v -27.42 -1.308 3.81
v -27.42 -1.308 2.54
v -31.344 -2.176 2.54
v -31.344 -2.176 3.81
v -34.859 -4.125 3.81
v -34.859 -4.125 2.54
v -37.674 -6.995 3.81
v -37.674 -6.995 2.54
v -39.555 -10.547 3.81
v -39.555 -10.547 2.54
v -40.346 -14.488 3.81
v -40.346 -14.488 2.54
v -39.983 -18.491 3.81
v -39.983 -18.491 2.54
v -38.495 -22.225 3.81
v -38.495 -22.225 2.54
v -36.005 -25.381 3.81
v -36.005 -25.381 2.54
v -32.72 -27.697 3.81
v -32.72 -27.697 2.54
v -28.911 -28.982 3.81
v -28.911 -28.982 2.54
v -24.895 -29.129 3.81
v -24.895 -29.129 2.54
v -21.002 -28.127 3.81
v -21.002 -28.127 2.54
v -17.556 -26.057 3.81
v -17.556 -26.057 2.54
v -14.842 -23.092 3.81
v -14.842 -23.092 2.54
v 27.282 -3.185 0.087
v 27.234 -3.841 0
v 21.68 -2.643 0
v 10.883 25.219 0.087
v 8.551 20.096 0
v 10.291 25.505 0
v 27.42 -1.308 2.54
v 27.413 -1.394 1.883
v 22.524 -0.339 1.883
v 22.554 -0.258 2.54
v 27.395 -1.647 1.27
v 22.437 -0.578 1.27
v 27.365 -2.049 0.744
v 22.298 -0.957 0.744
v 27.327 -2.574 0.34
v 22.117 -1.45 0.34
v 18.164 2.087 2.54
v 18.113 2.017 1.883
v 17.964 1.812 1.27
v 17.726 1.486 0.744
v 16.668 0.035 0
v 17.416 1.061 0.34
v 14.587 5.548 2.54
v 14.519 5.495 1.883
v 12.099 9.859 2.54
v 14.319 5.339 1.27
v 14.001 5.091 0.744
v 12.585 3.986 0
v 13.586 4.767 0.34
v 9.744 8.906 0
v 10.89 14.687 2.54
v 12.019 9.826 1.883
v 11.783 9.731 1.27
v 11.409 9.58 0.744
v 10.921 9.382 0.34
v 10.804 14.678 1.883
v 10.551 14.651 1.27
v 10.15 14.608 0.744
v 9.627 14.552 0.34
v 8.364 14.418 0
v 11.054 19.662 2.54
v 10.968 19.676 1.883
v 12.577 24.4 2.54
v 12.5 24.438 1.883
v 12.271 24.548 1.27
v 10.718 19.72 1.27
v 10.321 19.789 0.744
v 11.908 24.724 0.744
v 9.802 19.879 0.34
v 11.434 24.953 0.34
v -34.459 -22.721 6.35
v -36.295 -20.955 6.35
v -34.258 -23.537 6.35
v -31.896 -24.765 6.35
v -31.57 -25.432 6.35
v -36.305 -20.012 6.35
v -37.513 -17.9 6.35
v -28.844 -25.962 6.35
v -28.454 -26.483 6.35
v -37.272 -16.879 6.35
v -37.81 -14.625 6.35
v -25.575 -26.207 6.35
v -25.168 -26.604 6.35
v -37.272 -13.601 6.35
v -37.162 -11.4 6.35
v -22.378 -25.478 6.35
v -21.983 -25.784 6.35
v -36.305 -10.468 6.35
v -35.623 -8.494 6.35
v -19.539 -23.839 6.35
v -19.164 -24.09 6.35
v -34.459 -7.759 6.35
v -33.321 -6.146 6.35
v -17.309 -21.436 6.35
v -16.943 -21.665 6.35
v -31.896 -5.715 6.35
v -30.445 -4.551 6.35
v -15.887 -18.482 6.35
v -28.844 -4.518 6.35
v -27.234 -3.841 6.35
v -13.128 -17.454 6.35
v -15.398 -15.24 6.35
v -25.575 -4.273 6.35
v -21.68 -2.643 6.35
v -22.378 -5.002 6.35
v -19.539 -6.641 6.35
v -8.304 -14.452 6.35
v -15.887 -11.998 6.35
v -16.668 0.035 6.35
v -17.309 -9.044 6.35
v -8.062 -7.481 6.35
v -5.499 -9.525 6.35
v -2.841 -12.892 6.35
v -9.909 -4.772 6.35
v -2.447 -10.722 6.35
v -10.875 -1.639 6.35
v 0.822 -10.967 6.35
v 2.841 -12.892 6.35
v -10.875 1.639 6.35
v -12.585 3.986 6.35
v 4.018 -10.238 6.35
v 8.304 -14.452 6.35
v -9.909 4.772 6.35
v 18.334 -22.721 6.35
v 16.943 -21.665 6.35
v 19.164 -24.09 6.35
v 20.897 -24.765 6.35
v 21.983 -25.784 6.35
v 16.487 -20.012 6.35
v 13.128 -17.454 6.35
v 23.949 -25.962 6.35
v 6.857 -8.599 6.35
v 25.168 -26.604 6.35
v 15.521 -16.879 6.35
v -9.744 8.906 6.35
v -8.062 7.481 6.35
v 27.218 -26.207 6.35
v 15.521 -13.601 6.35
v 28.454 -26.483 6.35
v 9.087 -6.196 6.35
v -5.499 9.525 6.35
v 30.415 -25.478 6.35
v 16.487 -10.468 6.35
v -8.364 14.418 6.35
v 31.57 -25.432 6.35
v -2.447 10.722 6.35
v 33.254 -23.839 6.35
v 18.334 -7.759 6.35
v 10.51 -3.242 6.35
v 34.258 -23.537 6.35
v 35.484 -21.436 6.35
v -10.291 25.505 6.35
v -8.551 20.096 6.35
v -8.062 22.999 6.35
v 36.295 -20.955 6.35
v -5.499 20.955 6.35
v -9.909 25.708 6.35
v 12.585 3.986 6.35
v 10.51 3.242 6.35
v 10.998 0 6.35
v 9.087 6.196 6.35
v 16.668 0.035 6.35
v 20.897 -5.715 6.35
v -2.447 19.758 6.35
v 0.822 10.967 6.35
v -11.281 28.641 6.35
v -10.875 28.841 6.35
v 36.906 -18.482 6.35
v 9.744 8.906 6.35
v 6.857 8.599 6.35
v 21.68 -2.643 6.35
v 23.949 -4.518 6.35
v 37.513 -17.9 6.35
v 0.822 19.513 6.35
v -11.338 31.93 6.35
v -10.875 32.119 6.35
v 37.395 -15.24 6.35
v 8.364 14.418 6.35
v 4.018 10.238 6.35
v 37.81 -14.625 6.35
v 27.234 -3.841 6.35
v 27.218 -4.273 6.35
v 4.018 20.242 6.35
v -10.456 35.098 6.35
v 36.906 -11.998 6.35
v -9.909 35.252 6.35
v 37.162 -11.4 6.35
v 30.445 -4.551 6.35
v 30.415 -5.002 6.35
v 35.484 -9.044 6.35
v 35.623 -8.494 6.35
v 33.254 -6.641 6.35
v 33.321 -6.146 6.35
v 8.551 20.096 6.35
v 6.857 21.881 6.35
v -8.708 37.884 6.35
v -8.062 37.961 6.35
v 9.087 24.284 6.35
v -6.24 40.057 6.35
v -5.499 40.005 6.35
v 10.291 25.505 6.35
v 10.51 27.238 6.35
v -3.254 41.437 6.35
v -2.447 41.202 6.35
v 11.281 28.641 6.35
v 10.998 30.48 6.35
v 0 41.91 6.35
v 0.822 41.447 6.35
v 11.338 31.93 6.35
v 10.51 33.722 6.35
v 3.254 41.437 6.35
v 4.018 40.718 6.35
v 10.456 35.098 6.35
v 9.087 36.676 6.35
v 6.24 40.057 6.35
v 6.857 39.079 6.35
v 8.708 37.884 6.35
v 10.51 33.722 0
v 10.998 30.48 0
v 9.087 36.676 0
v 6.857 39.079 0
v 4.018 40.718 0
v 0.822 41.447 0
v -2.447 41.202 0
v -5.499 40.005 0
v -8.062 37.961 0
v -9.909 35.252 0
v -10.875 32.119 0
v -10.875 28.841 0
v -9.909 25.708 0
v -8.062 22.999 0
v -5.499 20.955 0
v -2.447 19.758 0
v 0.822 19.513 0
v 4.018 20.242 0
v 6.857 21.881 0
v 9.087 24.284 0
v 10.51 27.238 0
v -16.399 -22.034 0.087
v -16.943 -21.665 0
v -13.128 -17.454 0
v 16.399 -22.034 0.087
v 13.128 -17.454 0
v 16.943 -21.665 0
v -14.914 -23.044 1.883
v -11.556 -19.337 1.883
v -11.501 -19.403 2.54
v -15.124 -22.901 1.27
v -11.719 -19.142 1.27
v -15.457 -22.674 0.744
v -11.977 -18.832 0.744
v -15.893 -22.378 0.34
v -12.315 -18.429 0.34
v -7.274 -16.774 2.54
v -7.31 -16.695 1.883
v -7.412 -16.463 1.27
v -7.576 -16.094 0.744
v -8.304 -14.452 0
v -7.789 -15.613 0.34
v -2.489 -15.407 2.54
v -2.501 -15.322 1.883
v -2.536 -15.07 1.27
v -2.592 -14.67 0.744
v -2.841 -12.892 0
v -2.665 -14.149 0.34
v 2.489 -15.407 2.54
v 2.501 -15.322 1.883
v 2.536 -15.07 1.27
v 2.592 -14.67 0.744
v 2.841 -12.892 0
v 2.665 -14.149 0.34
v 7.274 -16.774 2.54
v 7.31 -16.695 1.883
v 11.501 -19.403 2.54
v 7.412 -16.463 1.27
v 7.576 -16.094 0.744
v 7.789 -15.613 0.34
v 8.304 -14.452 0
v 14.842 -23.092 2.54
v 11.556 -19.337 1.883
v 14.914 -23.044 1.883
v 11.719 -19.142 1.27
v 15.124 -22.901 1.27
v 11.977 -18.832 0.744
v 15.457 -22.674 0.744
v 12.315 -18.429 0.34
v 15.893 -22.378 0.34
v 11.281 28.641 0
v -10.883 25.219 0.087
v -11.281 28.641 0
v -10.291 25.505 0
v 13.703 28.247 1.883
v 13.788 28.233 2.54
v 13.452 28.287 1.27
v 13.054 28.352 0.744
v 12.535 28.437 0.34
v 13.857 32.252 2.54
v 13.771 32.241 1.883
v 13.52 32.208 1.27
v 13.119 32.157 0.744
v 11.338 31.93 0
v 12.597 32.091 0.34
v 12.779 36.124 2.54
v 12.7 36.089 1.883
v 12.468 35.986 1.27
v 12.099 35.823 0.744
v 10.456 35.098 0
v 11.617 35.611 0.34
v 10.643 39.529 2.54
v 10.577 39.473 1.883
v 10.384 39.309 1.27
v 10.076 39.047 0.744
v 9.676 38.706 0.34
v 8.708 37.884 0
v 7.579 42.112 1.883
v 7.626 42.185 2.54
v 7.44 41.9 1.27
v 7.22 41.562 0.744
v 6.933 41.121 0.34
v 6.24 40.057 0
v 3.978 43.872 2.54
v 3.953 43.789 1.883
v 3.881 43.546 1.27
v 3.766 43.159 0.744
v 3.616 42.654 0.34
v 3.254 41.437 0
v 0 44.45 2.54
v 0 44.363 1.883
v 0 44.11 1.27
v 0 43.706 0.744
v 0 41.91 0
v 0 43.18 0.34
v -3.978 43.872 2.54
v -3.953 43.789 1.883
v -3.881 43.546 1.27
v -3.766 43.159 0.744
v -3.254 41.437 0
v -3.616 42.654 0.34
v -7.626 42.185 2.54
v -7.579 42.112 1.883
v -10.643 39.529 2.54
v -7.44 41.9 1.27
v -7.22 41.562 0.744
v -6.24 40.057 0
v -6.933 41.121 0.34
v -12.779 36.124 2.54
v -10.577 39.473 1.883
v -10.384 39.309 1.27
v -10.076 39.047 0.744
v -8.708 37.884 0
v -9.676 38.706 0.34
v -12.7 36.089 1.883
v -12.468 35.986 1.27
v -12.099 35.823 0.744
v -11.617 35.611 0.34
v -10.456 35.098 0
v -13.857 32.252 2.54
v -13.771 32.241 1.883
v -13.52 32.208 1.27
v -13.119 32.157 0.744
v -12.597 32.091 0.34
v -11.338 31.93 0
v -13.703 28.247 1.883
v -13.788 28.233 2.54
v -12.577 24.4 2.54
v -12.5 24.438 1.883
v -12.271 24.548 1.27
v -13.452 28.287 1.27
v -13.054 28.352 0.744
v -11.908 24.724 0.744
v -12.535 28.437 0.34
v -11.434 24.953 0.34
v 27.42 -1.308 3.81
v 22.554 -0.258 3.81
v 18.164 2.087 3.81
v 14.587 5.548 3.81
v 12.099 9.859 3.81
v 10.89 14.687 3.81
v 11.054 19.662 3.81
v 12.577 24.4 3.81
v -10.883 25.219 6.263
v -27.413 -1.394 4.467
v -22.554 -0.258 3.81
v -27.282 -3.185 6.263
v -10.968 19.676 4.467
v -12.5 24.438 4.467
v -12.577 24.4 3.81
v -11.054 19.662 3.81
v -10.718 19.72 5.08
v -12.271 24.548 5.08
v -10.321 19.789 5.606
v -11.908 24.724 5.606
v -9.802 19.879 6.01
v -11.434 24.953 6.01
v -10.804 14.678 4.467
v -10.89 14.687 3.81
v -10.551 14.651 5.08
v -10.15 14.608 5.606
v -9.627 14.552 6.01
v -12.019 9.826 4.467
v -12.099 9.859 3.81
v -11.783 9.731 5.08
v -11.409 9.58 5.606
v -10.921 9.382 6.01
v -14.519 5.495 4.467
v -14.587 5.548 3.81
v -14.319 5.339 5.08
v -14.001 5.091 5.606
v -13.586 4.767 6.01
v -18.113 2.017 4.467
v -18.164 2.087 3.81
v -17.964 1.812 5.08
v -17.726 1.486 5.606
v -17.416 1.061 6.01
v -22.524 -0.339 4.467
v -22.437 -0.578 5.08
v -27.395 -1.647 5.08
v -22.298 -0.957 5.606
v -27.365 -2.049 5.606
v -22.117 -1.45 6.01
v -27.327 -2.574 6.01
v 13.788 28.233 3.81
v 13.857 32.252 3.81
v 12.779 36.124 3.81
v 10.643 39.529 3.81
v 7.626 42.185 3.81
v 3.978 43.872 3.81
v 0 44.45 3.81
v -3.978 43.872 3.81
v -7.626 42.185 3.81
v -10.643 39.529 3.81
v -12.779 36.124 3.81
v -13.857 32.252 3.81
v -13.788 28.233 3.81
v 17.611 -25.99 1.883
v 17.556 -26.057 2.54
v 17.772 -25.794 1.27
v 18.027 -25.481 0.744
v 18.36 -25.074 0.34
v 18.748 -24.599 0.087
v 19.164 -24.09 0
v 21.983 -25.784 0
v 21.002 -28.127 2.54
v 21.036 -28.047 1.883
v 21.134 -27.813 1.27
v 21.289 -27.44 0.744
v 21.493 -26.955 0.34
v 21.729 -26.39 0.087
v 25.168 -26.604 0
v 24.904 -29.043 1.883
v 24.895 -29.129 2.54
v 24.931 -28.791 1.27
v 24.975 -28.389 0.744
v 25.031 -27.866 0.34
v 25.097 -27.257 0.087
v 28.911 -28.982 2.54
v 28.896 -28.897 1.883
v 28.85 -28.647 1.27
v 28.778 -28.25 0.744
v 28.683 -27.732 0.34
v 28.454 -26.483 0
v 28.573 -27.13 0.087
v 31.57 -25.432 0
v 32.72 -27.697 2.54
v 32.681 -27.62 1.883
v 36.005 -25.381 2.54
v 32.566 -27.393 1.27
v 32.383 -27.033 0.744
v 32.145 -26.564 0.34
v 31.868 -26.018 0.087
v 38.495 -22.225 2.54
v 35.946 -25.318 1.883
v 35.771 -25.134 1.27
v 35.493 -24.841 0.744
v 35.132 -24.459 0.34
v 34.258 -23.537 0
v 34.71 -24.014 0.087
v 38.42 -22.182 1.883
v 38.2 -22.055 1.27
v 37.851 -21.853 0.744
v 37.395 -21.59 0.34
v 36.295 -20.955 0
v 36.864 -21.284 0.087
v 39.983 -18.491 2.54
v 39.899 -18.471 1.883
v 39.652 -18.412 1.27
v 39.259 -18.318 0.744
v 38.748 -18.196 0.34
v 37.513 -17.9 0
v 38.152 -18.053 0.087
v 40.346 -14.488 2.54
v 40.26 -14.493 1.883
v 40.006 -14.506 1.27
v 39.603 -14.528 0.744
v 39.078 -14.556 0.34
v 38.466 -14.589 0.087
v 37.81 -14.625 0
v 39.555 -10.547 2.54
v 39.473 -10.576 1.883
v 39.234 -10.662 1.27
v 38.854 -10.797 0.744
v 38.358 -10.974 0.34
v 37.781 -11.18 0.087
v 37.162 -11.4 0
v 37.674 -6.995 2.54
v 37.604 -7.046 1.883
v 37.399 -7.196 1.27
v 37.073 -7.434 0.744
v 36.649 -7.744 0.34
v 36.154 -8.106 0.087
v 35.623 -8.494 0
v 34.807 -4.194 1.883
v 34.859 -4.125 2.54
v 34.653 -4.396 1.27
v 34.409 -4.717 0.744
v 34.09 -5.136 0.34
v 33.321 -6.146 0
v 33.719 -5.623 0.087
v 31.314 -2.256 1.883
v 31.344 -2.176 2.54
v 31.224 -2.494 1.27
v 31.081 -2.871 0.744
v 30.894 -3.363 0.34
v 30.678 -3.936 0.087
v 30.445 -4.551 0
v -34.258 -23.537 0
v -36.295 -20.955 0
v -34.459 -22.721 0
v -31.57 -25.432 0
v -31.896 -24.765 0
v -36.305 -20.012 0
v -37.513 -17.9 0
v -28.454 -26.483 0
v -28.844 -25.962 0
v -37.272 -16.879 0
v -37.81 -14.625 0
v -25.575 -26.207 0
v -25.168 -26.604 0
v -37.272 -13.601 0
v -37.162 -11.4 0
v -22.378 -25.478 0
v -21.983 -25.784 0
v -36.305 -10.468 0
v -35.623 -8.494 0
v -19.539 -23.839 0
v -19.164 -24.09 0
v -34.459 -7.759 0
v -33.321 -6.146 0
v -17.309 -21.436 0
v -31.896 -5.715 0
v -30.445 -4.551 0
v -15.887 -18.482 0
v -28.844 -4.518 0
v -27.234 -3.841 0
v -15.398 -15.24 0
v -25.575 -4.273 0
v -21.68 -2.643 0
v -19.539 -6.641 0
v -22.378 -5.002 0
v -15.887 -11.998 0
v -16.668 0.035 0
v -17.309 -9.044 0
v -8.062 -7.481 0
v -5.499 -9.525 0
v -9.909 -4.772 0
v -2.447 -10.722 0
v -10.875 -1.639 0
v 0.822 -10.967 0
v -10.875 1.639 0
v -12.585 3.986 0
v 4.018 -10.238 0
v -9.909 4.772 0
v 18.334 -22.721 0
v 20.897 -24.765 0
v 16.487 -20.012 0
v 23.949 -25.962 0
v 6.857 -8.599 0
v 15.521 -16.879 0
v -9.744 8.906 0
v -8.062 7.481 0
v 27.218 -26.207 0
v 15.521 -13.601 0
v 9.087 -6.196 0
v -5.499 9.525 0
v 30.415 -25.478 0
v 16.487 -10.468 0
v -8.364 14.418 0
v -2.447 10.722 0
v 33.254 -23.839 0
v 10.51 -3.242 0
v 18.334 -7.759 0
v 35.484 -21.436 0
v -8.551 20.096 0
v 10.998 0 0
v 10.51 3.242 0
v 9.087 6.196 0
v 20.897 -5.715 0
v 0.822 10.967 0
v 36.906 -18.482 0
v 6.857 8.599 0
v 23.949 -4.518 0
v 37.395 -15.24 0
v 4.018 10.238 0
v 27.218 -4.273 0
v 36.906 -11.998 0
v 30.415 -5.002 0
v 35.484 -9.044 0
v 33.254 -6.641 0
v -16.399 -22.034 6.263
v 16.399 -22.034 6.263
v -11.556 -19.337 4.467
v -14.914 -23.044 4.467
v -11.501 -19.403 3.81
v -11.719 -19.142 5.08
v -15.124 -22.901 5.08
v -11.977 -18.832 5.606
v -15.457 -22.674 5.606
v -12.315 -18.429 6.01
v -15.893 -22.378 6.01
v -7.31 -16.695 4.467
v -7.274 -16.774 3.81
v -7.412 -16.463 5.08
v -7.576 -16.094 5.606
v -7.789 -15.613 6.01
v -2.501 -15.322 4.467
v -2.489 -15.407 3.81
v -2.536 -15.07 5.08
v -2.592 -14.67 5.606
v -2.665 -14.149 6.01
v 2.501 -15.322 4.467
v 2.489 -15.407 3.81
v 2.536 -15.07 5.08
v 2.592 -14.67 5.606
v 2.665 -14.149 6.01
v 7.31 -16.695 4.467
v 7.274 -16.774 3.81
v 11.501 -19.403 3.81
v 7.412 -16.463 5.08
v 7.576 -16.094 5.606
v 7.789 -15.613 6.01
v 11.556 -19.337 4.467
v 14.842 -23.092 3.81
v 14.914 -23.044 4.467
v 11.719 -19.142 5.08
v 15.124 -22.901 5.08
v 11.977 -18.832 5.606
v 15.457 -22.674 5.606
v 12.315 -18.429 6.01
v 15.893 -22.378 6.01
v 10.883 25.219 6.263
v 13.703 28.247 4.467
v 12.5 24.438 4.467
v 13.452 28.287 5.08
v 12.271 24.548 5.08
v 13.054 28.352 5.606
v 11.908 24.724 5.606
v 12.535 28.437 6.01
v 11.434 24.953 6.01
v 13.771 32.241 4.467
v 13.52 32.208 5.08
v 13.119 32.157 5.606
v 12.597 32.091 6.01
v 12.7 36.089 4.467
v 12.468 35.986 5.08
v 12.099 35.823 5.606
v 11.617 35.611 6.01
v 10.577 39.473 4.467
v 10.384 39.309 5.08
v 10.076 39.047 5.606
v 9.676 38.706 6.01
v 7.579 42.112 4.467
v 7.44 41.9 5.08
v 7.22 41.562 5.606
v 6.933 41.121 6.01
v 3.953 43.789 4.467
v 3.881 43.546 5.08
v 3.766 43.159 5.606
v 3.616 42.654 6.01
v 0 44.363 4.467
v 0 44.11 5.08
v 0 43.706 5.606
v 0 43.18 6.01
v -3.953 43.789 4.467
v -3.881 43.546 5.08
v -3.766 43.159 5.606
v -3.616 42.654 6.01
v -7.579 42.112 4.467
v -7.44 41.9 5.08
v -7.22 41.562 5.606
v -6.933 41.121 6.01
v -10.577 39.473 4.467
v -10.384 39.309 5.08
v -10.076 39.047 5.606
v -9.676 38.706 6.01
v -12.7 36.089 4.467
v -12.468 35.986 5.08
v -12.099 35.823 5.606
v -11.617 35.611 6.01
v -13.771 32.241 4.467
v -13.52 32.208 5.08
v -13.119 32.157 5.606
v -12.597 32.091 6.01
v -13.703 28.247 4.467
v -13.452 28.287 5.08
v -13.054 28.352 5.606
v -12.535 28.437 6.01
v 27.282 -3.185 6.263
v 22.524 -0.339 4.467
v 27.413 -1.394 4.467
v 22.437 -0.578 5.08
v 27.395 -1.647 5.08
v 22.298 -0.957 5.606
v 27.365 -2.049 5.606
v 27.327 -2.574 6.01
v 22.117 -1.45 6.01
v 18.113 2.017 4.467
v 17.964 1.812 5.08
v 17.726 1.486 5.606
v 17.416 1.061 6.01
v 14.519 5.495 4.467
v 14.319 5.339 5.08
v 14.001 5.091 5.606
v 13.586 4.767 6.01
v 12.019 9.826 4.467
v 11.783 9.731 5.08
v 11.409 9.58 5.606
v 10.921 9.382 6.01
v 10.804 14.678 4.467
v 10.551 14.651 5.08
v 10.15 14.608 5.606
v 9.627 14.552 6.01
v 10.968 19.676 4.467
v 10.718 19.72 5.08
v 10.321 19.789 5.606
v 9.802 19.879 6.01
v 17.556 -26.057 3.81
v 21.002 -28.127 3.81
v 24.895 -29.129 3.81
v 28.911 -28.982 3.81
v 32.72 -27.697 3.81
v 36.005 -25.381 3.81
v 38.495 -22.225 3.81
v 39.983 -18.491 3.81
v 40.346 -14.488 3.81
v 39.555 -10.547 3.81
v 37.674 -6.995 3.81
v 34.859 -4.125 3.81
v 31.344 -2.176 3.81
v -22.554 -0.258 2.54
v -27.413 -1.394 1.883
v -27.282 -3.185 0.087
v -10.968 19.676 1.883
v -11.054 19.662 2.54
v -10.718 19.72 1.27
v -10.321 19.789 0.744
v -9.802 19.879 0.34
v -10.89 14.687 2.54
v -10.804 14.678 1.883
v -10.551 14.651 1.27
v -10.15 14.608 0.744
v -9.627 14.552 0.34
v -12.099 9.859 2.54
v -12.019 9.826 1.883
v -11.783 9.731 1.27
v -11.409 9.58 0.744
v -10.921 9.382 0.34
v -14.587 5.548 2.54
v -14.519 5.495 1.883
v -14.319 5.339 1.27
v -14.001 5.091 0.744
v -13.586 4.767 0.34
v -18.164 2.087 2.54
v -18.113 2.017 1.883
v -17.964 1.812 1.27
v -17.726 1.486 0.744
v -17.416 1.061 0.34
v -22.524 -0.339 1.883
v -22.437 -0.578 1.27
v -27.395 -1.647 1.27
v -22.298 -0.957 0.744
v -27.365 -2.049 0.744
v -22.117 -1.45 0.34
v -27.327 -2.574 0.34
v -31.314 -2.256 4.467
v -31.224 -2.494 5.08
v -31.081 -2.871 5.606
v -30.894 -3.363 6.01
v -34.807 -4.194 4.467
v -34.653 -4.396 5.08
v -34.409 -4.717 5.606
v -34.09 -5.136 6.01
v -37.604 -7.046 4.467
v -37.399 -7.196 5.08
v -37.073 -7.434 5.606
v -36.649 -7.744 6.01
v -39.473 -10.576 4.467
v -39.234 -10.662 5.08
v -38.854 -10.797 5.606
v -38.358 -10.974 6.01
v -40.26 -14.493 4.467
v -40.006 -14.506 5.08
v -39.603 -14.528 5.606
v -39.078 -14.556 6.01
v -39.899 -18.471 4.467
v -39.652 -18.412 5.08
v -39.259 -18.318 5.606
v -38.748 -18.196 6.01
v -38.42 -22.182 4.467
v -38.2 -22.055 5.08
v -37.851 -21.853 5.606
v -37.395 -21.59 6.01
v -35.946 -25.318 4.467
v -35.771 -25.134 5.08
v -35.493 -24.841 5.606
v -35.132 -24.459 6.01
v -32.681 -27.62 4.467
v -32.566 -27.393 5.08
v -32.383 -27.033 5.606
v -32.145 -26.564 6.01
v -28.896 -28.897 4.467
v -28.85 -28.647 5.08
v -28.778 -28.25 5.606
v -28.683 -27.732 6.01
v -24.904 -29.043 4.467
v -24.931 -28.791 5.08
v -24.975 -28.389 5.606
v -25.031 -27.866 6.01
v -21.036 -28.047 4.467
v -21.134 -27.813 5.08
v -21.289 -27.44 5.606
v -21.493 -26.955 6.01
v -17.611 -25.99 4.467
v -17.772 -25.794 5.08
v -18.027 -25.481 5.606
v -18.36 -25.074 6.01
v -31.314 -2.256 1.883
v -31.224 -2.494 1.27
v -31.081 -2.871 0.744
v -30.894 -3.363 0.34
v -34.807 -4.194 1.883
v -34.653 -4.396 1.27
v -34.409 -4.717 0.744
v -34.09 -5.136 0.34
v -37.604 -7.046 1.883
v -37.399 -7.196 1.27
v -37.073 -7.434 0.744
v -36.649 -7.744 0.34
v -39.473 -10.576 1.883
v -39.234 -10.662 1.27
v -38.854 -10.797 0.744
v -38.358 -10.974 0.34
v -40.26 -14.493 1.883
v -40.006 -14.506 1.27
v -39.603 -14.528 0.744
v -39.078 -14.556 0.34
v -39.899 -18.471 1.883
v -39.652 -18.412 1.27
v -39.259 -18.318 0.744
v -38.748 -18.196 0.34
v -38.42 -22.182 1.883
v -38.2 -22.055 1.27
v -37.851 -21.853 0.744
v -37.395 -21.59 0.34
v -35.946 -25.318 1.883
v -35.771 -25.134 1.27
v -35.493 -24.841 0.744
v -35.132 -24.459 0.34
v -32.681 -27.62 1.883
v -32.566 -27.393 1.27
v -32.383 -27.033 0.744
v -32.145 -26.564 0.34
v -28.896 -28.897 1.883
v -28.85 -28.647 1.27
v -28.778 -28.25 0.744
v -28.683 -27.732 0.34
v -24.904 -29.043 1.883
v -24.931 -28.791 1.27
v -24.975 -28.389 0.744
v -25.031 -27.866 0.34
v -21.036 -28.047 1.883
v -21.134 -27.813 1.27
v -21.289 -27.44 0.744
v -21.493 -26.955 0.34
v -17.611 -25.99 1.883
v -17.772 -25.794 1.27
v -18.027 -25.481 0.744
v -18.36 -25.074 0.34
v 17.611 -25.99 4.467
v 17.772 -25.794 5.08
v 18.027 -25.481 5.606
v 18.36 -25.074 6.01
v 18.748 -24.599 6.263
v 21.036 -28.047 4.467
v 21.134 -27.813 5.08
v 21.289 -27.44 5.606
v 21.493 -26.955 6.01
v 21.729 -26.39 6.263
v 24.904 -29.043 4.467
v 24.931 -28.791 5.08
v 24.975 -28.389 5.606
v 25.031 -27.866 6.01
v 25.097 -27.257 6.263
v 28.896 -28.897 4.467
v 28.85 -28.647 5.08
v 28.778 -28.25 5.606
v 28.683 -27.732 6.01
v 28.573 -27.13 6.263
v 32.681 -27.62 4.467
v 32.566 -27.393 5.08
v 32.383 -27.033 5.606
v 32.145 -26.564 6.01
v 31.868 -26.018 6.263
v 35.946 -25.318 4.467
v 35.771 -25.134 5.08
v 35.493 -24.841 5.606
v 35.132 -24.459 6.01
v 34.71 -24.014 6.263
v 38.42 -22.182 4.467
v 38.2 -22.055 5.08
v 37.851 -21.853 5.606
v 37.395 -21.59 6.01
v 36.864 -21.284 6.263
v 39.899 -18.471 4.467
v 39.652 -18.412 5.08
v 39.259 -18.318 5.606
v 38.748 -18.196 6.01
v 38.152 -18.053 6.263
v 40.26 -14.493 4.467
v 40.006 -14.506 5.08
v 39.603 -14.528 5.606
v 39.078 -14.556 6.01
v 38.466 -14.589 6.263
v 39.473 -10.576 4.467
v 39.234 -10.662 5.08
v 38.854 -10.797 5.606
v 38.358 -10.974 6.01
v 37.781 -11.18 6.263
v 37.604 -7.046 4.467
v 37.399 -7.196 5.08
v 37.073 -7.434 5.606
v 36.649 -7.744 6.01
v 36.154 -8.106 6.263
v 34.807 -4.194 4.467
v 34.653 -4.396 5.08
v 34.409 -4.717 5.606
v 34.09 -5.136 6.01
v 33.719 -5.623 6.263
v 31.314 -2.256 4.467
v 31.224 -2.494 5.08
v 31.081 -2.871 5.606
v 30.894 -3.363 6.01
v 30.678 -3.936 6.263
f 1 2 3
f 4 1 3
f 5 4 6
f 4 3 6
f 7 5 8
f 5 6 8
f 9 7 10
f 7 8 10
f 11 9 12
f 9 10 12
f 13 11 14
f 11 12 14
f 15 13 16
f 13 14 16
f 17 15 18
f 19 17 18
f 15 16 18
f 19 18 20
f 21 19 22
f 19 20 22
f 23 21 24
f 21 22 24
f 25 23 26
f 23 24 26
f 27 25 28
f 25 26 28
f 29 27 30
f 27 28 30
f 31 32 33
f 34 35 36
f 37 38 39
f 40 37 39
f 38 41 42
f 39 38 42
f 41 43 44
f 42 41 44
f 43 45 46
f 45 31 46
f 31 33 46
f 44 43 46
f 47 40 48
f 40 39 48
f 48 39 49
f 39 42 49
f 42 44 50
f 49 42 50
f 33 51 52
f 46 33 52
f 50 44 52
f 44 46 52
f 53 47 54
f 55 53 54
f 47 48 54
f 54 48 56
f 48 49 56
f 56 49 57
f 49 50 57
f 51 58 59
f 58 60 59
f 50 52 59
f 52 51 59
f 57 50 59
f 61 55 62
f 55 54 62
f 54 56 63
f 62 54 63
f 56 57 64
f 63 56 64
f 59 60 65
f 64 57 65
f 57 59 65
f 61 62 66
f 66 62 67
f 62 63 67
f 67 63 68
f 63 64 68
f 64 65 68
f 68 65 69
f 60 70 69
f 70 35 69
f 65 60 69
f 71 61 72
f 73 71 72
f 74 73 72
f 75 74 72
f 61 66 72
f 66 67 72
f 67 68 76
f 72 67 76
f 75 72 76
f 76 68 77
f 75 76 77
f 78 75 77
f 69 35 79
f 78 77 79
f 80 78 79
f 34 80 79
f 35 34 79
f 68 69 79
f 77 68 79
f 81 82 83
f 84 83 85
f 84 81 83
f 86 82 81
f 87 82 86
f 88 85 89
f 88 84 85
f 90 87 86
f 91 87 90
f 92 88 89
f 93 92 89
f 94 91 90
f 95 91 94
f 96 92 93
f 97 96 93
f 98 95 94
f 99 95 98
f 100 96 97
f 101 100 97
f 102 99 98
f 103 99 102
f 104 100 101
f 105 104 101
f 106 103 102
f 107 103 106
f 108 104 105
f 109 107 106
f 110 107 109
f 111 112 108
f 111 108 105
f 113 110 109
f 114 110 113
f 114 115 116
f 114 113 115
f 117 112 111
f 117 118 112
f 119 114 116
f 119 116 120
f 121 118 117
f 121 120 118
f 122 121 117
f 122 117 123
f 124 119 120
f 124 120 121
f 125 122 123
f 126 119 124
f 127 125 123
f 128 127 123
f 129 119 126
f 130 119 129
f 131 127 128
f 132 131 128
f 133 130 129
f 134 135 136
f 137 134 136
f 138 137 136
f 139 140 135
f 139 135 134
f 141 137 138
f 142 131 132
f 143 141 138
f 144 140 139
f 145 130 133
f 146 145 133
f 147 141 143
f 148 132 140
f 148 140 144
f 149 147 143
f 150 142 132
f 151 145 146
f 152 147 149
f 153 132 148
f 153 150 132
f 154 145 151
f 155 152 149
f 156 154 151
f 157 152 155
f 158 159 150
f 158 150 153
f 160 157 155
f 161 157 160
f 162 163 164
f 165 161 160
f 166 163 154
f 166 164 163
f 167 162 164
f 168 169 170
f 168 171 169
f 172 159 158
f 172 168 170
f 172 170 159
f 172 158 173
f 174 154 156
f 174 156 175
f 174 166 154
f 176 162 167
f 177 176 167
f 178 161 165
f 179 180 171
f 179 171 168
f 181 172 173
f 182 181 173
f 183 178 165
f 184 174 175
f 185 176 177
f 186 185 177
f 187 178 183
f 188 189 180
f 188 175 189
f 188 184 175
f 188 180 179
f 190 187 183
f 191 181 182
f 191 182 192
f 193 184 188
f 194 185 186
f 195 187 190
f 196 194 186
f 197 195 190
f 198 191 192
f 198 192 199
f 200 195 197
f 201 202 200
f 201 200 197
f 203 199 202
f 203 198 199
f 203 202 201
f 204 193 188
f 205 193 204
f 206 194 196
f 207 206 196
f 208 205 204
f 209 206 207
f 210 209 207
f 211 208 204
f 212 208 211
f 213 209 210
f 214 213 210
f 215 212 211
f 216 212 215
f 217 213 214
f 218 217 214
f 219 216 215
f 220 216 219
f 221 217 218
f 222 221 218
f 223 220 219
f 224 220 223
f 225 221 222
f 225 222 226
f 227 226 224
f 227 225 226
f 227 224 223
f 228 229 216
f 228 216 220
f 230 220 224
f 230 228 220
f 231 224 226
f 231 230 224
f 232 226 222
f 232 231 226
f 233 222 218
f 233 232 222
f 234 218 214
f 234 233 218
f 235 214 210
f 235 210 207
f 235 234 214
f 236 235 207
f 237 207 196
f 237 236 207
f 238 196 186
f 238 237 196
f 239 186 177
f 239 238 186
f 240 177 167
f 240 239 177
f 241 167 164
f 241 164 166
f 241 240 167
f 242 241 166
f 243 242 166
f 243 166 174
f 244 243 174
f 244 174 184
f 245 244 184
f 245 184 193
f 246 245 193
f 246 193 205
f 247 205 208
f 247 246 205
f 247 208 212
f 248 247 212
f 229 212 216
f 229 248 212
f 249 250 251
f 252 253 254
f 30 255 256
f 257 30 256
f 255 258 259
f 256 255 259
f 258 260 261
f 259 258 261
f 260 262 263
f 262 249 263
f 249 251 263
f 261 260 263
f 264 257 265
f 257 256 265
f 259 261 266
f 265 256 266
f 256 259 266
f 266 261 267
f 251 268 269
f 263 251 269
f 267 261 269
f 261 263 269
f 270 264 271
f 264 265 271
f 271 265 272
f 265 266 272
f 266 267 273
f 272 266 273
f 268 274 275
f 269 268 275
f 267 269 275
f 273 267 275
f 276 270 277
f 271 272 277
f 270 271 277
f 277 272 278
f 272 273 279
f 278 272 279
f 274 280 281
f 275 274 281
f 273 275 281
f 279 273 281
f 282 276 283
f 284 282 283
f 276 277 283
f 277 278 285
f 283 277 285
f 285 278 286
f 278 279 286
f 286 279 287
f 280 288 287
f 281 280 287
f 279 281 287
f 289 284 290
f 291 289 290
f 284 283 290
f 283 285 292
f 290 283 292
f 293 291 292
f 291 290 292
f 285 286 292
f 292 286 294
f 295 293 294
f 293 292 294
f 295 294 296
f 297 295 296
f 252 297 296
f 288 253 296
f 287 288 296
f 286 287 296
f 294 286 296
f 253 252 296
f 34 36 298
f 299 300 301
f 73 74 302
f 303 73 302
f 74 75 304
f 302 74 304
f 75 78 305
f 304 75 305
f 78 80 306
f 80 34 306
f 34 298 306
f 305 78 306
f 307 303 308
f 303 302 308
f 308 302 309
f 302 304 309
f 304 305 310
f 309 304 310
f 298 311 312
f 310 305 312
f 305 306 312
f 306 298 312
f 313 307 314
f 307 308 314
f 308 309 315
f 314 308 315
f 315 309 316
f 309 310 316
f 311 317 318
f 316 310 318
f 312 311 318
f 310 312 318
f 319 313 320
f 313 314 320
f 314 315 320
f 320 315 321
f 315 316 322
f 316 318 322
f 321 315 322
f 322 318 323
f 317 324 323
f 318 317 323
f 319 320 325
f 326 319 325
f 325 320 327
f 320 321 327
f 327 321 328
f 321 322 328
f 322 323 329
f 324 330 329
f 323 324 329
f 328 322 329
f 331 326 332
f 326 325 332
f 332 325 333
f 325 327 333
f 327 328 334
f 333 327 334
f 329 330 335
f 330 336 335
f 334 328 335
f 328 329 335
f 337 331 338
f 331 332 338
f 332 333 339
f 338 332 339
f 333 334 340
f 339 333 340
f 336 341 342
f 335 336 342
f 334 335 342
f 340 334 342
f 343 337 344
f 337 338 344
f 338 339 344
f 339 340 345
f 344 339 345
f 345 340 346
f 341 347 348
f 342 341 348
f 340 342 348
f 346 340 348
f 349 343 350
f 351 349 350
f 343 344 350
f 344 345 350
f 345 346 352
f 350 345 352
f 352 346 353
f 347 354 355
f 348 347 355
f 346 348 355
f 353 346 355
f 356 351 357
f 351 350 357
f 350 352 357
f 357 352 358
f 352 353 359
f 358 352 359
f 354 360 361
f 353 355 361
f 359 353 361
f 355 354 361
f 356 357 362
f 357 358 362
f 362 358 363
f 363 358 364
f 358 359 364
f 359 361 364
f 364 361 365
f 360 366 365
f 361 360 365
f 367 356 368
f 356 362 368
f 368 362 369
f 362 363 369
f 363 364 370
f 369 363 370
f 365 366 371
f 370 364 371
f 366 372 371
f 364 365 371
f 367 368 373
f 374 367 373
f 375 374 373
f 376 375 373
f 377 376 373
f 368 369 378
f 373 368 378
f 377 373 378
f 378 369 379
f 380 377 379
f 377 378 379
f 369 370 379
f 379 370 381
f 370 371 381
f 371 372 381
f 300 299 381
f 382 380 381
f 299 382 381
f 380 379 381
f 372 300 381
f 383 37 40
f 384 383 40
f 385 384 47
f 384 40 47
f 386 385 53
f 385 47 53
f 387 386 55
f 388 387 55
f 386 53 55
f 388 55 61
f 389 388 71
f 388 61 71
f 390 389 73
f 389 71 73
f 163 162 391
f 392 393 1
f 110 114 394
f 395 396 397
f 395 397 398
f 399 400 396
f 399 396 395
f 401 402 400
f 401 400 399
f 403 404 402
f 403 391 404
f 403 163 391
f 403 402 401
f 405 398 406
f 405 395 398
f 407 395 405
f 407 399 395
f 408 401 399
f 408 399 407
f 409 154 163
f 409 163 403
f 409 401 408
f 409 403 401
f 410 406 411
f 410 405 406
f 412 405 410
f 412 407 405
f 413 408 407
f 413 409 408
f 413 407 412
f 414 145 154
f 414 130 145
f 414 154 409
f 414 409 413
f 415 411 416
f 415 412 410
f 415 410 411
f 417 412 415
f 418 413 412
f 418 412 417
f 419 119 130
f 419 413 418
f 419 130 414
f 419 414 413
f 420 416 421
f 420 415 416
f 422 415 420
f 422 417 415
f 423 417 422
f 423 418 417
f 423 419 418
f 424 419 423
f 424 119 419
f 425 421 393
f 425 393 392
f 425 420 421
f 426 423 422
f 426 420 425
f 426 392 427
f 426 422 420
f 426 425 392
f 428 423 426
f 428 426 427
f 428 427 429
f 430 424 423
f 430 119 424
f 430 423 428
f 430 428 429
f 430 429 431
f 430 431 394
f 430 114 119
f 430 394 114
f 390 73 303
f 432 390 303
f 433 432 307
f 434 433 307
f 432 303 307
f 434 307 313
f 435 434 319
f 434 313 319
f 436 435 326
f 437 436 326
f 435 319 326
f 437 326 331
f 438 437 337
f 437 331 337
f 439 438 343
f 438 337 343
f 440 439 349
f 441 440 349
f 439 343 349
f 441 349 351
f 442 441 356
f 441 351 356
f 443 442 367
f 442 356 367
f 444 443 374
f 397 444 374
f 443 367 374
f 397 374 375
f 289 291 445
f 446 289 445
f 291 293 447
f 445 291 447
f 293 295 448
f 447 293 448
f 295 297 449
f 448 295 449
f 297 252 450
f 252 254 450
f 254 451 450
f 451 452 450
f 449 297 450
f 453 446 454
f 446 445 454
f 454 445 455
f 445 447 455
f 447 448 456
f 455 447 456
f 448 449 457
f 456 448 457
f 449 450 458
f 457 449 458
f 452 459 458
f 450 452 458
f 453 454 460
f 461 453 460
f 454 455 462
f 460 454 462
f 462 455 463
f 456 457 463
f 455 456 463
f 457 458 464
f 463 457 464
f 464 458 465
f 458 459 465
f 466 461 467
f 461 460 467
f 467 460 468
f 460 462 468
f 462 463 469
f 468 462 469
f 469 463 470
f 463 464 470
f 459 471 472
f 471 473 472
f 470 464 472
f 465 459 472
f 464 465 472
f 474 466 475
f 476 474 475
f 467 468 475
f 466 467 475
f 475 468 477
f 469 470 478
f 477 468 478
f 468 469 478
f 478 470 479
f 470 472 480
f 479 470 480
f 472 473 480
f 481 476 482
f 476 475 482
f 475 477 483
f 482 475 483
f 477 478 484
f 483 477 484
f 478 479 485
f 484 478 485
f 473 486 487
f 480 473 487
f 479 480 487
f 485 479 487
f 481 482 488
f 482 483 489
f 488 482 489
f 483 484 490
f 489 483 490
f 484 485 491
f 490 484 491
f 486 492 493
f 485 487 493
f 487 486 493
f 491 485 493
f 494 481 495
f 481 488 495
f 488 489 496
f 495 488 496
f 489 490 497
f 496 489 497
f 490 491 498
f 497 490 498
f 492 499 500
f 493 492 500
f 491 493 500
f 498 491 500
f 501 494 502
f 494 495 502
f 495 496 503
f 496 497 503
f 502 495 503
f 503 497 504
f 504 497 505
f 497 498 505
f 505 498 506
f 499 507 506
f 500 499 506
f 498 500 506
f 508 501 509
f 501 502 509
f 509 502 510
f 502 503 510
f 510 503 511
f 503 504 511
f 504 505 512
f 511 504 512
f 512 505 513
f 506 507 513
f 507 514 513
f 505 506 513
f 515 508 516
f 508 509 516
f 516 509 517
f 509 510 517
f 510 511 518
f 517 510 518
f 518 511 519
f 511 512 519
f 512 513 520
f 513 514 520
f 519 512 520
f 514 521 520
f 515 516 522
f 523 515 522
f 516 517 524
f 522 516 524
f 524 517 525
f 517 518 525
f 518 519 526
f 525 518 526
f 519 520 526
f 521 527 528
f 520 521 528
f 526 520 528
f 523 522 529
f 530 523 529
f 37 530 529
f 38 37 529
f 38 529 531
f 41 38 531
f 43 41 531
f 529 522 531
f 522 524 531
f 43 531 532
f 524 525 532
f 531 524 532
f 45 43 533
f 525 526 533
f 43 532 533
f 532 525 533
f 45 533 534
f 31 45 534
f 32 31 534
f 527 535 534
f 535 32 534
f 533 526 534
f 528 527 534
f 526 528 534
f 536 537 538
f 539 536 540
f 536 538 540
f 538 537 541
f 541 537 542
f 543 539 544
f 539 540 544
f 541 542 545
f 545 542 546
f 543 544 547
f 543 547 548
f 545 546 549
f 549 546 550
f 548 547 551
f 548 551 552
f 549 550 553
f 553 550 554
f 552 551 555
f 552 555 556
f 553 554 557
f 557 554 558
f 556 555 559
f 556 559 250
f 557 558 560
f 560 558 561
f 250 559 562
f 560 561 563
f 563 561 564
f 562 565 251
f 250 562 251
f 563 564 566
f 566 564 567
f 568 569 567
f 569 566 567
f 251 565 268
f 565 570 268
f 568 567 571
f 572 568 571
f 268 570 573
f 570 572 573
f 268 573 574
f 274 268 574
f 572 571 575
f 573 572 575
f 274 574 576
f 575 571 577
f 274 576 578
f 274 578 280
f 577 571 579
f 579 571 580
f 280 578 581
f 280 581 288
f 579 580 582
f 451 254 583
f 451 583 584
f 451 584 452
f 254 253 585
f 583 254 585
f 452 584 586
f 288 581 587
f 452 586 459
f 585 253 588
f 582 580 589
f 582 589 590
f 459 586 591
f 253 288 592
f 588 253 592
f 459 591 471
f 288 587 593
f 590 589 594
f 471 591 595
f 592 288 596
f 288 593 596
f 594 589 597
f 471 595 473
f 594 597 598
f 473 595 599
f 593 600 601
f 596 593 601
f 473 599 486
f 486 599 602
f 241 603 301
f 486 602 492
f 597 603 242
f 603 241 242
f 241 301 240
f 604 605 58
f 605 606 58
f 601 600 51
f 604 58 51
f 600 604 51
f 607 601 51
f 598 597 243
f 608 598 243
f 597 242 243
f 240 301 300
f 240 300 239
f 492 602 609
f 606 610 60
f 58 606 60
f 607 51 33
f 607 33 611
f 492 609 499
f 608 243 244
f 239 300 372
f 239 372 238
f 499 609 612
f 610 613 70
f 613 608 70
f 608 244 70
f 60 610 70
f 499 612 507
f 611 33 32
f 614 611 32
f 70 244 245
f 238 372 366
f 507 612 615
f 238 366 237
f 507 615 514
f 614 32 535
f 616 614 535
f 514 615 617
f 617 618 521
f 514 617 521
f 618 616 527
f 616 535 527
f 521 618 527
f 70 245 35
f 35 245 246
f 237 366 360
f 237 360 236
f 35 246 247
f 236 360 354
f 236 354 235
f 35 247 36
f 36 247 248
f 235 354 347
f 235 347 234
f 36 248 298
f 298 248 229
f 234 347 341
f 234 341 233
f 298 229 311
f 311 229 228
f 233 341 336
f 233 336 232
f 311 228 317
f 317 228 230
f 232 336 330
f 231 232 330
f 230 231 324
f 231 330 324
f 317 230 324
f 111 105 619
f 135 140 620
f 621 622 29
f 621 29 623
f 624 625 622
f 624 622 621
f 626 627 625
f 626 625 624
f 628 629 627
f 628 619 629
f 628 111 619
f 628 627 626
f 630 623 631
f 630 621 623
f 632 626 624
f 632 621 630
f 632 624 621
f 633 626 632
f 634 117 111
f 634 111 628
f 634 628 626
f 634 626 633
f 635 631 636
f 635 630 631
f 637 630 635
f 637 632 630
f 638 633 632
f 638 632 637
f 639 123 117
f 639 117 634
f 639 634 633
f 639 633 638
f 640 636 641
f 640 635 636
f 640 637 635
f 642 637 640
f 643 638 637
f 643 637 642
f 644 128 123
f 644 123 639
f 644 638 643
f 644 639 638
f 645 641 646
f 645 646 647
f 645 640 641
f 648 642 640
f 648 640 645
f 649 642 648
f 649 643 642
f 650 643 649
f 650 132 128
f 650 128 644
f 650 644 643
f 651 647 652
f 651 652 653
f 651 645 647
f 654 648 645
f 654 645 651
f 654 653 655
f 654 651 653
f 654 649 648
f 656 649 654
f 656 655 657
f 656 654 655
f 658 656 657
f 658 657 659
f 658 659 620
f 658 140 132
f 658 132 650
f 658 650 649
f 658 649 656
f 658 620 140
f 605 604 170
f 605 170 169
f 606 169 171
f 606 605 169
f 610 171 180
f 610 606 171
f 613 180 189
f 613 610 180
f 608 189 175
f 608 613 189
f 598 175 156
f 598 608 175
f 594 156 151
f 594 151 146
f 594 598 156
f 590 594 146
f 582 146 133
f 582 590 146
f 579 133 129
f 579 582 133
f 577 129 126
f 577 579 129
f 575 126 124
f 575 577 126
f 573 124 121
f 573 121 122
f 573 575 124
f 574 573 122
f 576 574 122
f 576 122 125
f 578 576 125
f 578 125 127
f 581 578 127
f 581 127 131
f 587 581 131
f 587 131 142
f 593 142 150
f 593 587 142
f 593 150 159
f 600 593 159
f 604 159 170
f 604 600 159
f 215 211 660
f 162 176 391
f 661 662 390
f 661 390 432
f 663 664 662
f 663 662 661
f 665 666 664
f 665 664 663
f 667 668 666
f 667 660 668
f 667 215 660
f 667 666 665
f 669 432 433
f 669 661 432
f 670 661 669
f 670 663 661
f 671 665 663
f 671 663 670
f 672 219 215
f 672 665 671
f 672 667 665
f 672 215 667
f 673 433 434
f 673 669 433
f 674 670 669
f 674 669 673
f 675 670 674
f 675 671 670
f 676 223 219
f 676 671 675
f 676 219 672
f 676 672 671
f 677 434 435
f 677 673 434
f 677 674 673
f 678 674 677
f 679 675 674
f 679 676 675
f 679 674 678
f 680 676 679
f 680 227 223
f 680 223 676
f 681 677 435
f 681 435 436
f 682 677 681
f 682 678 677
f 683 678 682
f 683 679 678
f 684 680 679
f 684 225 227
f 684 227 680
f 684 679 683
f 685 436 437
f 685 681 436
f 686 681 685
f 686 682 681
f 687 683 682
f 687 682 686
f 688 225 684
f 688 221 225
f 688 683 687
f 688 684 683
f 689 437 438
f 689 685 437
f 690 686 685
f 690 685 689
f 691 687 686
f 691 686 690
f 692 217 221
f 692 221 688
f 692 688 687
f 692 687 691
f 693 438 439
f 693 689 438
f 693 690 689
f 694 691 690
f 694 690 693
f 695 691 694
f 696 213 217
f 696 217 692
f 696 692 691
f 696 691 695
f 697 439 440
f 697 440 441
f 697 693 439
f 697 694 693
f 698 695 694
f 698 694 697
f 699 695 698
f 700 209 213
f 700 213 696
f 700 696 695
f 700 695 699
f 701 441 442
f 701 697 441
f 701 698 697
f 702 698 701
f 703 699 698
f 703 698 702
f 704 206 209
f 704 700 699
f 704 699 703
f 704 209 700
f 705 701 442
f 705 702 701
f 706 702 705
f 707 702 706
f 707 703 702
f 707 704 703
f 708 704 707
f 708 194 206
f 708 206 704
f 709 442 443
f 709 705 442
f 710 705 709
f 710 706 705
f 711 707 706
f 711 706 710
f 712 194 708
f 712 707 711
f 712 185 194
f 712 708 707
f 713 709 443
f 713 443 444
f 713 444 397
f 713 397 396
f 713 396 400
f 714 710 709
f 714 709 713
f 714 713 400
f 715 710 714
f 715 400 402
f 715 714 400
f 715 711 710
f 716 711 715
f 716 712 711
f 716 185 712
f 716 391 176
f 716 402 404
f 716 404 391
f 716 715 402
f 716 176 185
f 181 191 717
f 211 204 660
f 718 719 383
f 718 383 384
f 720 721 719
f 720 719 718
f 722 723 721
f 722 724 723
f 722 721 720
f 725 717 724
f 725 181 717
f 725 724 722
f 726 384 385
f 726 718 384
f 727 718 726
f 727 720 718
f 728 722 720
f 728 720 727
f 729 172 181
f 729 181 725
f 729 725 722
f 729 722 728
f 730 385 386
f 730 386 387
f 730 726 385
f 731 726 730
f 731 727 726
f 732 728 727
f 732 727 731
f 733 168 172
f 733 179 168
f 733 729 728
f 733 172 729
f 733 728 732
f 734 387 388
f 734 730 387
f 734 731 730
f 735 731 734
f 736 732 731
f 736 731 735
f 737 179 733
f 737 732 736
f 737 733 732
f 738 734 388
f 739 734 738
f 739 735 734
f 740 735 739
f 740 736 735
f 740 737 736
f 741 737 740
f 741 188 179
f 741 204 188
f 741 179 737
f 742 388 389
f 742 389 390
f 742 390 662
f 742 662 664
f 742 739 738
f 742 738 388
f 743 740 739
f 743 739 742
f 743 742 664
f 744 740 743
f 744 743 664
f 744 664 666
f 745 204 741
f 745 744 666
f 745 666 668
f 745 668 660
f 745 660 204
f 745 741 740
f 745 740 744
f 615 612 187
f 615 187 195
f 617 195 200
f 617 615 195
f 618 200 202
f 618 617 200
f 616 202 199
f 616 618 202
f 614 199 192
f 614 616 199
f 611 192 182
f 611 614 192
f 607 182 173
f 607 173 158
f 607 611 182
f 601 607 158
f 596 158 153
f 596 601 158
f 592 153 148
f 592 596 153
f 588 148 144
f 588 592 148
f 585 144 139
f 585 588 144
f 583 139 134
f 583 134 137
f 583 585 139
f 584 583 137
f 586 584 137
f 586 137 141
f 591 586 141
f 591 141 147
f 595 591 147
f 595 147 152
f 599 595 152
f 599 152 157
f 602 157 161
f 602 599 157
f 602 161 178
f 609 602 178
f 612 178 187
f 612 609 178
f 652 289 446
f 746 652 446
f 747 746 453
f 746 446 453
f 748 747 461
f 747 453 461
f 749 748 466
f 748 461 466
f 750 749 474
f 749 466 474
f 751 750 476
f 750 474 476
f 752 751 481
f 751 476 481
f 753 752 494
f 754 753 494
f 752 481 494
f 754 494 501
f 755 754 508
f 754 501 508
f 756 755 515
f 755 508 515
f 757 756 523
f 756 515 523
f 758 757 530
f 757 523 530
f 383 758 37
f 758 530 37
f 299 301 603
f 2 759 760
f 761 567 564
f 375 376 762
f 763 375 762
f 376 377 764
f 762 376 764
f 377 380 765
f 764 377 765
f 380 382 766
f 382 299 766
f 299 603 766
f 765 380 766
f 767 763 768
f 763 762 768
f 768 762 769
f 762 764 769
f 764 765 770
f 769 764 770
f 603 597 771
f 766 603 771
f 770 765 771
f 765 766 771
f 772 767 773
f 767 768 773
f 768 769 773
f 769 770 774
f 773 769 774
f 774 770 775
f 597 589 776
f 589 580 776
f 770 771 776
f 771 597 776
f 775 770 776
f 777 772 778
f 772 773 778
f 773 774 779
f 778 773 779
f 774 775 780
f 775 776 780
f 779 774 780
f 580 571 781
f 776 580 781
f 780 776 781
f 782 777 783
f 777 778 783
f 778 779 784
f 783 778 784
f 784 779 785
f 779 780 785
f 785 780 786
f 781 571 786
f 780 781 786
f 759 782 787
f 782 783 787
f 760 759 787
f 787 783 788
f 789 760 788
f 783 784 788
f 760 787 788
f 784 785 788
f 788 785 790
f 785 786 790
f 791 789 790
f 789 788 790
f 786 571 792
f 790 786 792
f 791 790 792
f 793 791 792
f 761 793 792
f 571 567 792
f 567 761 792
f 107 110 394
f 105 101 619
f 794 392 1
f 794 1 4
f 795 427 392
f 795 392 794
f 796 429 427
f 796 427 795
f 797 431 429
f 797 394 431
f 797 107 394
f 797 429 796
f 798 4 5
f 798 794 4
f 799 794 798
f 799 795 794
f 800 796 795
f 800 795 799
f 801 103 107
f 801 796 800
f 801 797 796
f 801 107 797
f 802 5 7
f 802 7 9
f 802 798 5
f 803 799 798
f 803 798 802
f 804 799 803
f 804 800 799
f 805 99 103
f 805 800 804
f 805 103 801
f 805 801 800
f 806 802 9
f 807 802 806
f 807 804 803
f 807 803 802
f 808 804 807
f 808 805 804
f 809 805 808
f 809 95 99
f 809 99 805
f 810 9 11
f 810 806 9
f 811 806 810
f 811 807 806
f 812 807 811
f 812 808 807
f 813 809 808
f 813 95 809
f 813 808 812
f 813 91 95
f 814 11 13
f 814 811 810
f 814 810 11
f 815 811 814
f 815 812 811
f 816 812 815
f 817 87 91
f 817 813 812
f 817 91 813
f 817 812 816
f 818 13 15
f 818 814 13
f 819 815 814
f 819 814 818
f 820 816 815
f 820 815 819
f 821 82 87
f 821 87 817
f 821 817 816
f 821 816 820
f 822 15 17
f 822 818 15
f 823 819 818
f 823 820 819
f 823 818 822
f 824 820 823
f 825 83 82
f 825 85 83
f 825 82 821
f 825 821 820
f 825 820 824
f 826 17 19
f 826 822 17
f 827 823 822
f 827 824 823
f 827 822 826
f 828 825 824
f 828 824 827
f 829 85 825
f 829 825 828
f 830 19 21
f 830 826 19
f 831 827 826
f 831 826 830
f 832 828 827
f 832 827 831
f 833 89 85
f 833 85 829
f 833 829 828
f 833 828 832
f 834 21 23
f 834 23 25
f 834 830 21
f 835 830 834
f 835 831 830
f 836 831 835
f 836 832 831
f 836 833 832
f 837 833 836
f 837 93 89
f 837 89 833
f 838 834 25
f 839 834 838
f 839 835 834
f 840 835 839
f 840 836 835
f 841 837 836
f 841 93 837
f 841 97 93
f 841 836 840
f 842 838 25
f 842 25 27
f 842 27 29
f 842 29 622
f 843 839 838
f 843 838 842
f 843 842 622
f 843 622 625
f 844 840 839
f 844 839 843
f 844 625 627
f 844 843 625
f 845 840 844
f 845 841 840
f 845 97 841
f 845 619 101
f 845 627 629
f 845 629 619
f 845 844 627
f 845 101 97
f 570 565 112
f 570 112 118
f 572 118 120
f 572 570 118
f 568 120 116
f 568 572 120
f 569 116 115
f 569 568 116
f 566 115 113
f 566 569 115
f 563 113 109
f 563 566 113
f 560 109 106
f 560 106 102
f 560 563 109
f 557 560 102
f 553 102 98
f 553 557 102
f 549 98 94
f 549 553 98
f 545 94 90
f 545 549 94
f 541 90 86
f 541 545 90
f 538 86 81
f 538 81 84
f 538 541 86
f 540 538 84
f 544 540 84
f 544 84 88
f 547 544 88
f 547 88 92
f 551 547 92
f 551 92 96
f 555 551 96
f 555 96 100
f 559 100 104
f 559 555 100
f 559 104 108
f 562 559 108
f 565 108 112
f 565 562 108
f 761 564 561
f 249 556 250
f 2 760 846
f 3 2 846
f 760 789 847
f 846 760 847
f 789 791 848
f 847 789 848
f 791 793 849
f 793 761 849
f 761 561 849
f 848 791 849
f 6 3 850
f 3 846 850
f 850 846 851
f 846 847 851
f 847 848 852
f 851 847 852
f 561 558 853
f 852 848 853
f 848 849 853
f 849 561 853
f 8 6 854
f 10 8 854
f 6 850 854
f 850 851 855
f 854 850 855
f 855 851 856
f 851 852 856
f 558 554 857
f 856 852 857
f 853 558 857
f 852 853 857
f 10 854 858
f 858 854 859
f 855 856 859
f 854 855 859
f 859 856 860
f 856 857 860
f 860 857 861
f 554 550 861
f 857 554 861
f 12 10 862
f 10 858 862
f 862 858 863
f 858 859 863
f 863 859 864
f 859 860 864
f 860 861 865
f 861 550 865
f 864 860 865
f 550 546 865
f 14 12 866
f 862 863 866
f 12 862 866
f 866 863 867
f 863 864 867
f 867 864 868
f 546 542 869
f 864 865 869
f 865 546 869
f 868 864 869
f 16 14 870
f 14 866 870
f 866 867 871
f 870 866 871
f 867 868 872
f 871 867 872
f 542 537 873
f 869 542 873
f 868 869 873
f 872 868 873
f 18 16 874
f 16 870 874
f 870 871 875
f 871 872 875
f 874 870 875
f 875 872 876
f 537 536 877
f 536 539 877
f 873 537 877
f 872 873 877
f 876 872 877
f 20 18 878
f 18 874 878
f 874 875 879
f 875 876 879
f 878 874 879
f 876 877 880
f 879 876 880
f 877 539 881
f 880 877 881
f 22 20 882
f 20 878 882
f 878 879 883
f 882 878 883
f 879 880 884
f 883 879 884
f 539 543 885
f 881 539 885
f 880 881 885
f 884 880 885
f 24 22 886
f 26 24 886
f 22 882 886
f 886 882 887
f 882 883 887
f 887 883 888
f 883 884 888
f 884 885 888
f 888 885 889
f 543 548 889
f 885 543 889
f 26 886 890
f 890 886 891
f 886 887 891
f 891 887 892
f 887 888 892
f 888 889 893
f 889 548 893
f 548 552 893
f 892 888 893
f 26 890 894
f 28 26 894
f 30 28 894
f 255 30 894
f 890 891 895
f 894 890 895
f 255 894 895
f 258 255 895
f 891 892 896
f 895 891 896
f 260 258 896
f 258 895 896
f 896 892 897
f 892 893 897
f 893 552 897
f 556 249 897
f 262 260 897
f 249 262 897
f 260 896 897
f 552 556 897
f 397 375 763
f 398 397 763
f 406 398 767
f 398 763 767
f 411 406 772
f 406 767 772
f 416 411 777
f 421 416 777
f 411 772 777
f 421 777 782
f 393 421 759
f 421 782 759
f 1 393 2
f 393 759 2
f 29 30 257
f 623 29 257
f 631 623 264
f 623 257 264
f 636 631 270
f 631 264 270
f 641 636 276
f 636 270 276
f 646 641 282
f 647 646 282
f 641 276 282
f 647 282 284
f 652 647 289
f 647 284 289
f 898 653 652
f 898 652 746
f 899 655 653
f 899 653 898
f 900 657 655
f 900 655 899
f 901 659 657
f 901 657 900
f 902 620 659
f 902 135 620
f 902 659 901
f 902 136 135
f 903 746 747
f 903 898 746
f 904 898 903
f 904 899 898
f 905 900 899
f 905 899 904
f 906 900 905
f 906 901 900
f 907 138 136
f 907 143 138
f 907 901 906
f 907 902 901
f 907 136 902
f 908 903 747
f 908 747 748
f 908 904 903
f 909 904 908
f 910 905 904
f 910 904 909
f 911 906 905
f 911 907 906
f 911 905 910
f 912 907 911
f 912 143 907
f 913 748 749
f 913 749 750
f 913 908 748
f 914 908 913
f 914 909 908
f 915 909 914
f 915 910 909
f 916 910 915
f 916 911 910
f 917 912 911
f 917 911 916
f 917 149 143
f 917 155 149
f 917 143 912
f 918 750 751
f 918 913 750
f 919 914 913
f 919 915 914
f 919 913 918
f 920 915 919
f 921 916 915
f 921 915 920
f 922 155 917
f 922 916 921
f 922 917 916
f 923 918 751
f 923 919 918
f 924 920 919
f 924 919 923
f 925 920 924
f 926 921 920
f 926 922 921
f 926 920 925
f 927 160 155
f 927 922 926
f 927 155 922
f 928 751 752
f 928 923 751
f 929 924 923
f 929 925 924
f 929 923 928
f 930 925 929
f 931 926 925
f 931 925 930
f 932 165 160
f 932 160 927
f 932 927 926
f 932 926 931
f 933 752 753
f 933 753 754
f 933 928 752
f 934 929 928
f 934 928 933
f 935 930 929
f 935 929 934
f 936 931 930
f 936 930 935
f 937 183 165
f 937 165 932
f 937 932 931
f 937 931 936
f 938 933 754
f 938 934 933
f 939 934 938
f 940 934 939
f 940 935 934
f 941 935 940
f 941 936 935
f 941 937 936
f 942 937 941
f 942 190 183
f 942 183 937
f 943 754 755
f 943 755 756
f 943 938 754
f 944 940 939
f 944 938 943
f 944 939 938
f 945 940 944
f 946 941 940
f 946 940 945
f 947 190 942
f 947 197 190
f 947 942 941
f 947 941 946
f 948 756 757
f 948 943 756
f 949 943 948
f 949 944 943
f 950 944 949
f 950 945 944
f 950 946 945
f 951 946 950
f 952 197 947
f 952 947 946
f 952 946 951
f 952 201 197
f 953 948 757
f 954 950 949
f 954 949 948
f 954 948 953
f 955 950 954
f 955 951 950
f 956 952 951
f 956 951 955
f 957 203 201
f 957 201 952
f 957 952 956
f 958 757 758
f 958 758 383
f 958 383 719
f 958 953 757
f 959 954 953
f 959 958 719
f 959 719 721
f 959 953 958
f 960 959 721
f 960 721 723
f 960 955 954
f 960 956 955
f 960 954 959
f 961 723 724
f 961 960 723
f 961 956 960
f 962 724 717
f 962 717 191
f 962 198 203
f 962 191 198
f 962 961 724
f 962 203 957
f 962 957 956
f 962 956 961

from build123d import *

# Parameters (mm, degrees)
F0_R     = 10.9982
F1_DEPTH = 6.35
F2_R     = 2.54


with BuildPart() as f1:
    # F0 (on Top) → F1 (new body)
    with BuildSketch(Plane.XY):
        with BuildLine():
            ThreePointArc((27.419616, -1.307519), (13.19288, 7.616913), (12.577464, 24.399843))
            ThreePointArc((12.577464, 24.399843), (0, 44.45), (-12.577464, 24.399843))
            ThreePointArc((-12.577464, 24.399843), (-13.19288, 7.616913), (-27.419616, -1.307519))
            ThreePointArc((-27.419616, -1.307519), (-38.494829, -22.225), (-14.842152, -23.092325))
            ThreePointArc((-14.842152, -23.092325), (0, -15.233826), (14.842152, -23.092325))
            ThreePointArc((14.842152, -23.092325), (38.494829, -22.225), (27.419616, -1.307519))
        make_face()
        with Locations((-26.396454, -15.24)):
            Circle(F0_R, mode=Mode.SUBTRACT)
        with Locations((26.396454, -15.24)):
            Circle(F0_R, mode=Mode.SUBTRACT)
        Circle(F0_R, mode=Mode.SUBTRACT)
        with Locations((0, 30.48)):
            Circle(F0_R, mode=Mode.SUBTRACT)
    extrude(amount=F1_DEPTH)

    # F2
    f2_edges = [f1.edges().sort_by_distance(p)[0] for p in [
        (0, -15.233826, 6.35),
        (13.19288, 7.616913, 0),
    ]]
    fillet(f2_edges, radius=F2_R)


solid = f1.part
